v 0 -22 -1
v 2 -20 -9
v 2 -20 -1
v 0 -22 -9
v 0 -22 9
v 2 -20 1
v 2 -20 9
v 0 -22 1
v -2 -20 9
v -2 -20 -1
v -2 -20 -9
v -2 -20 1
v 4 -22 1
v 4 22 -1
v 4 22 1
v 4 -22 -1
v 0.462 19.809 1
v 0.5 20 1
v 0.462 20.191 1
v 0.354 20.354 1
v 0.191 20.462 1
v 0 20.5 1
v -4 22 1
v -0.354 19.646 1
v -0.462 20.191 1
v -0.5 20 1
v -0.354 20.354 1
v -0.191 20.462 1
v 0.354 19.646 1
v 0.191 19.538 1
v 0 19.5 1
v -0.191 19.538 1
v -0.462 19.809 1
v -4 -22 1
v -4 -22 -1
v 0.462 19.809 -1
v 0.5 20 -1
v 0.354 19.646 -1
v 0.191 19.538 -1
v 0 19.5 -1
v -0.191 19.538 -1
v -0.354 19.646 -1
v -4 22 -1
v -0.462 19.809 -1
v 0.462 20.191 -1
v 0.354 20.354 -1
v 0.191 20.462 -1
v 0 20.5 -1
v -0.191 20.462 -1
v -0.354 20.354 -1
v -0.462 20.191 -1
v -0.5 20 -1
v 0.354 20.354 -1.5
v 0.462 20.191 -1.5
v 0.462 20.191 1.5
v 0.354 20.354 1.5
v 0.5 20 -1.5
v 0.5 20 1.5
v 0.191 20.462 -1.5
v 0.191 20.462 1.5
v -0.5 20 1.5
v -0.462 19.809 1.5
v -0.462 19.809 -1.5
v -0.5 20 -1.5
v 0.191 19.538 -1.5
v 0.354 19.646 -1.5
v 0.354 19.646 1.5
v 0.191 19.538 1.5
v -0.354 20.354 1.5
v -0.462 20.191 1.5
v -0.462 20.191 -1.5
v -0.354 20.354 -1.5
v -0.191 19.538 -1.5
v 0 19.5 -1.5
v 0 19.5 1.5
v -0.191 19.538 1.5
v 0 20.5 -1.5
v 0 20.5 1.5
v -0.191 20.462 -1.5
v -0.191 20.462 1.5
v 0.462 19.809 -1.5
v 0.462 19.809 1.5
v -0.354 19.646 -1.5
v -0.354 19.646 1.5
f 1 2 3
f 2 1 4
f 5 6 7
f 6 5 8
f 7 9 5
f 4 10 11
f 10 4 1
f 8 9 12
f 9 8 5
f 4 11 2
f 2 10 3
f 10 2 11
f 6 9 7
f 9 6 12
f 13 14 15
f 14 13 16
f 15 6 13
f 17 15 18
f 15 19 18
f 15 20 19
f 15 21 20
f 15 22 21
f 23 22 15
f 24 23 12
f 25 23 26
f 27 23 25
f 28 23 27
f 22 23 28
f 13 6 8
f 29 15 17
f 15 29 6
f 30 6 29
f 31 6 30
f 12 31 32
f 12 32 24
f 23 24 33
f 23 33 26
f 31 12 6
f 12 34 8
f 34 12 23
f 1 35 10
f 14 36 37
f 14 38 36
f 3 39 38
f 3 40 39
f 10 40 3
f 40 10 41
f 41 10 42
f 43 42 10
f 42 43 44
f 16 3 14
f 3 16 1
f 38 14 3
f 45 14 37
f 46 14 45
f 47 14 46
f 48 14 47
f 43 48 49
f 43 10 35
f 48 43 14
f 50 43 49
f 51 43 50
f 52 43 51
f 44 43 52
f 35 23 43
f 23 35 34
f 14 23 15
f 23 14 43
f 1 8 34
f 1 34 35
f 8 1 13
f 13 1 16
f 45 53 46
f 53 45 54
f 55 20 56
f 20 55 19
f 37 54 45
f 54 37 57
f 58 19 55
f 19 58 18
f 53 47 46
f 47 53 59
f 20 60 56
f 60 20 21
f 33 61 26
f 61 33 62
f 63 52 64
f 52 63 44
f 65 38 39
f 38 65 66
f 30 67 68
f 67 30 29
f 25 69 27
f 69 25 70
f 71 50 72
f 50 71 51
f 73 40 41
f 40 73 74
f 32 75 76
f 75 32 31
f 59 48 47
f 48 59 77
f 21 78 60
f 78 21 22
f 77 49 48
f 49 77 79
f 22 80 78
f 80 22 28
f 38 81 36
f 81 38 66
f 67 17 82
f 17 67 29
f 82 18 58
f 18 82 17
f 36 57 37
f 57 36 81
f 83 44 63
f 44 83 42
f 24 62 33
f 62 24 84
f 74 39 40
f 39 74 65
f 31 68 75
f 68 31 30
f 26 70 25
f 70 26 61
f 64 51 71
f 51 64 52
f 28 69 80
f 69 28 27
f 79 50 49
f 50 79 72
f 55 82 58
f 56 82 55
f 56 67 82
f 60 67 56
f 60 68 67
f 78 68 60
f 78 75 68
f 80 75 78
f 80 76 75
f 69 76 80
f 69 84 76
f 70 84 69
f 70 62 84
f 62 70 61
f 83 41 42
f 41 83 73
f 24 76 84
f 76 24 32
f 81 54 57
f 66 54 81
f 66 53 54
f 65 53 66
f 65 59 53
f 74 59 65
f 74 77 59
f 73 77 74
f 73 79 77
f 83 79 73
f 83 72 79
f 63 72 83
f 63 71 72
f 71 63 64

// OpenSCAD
D=[8,44,2];
Q=4;
H=18;
BY=20;
BH=3;
BD=1;

module m() {
    
    cube(D,center=true);
    
    
    translate([0,-D[1]/2+Q/2,0])
    difference() {
        cylinder($fn=4,d=Q,h=H,center=true);
        translate([0,50,0])
        cube(100,center=true);
    }
    translate([0,BY,0])
    cylinder($fn=16,d=BD,h=BH,center=true);
}

module o() {
translate(-D/2+[0,0,1])
import("/home/kirk/Downloads/Roló-csúszka-2.stl");
}

difference() {
//  o();
   m();

}
